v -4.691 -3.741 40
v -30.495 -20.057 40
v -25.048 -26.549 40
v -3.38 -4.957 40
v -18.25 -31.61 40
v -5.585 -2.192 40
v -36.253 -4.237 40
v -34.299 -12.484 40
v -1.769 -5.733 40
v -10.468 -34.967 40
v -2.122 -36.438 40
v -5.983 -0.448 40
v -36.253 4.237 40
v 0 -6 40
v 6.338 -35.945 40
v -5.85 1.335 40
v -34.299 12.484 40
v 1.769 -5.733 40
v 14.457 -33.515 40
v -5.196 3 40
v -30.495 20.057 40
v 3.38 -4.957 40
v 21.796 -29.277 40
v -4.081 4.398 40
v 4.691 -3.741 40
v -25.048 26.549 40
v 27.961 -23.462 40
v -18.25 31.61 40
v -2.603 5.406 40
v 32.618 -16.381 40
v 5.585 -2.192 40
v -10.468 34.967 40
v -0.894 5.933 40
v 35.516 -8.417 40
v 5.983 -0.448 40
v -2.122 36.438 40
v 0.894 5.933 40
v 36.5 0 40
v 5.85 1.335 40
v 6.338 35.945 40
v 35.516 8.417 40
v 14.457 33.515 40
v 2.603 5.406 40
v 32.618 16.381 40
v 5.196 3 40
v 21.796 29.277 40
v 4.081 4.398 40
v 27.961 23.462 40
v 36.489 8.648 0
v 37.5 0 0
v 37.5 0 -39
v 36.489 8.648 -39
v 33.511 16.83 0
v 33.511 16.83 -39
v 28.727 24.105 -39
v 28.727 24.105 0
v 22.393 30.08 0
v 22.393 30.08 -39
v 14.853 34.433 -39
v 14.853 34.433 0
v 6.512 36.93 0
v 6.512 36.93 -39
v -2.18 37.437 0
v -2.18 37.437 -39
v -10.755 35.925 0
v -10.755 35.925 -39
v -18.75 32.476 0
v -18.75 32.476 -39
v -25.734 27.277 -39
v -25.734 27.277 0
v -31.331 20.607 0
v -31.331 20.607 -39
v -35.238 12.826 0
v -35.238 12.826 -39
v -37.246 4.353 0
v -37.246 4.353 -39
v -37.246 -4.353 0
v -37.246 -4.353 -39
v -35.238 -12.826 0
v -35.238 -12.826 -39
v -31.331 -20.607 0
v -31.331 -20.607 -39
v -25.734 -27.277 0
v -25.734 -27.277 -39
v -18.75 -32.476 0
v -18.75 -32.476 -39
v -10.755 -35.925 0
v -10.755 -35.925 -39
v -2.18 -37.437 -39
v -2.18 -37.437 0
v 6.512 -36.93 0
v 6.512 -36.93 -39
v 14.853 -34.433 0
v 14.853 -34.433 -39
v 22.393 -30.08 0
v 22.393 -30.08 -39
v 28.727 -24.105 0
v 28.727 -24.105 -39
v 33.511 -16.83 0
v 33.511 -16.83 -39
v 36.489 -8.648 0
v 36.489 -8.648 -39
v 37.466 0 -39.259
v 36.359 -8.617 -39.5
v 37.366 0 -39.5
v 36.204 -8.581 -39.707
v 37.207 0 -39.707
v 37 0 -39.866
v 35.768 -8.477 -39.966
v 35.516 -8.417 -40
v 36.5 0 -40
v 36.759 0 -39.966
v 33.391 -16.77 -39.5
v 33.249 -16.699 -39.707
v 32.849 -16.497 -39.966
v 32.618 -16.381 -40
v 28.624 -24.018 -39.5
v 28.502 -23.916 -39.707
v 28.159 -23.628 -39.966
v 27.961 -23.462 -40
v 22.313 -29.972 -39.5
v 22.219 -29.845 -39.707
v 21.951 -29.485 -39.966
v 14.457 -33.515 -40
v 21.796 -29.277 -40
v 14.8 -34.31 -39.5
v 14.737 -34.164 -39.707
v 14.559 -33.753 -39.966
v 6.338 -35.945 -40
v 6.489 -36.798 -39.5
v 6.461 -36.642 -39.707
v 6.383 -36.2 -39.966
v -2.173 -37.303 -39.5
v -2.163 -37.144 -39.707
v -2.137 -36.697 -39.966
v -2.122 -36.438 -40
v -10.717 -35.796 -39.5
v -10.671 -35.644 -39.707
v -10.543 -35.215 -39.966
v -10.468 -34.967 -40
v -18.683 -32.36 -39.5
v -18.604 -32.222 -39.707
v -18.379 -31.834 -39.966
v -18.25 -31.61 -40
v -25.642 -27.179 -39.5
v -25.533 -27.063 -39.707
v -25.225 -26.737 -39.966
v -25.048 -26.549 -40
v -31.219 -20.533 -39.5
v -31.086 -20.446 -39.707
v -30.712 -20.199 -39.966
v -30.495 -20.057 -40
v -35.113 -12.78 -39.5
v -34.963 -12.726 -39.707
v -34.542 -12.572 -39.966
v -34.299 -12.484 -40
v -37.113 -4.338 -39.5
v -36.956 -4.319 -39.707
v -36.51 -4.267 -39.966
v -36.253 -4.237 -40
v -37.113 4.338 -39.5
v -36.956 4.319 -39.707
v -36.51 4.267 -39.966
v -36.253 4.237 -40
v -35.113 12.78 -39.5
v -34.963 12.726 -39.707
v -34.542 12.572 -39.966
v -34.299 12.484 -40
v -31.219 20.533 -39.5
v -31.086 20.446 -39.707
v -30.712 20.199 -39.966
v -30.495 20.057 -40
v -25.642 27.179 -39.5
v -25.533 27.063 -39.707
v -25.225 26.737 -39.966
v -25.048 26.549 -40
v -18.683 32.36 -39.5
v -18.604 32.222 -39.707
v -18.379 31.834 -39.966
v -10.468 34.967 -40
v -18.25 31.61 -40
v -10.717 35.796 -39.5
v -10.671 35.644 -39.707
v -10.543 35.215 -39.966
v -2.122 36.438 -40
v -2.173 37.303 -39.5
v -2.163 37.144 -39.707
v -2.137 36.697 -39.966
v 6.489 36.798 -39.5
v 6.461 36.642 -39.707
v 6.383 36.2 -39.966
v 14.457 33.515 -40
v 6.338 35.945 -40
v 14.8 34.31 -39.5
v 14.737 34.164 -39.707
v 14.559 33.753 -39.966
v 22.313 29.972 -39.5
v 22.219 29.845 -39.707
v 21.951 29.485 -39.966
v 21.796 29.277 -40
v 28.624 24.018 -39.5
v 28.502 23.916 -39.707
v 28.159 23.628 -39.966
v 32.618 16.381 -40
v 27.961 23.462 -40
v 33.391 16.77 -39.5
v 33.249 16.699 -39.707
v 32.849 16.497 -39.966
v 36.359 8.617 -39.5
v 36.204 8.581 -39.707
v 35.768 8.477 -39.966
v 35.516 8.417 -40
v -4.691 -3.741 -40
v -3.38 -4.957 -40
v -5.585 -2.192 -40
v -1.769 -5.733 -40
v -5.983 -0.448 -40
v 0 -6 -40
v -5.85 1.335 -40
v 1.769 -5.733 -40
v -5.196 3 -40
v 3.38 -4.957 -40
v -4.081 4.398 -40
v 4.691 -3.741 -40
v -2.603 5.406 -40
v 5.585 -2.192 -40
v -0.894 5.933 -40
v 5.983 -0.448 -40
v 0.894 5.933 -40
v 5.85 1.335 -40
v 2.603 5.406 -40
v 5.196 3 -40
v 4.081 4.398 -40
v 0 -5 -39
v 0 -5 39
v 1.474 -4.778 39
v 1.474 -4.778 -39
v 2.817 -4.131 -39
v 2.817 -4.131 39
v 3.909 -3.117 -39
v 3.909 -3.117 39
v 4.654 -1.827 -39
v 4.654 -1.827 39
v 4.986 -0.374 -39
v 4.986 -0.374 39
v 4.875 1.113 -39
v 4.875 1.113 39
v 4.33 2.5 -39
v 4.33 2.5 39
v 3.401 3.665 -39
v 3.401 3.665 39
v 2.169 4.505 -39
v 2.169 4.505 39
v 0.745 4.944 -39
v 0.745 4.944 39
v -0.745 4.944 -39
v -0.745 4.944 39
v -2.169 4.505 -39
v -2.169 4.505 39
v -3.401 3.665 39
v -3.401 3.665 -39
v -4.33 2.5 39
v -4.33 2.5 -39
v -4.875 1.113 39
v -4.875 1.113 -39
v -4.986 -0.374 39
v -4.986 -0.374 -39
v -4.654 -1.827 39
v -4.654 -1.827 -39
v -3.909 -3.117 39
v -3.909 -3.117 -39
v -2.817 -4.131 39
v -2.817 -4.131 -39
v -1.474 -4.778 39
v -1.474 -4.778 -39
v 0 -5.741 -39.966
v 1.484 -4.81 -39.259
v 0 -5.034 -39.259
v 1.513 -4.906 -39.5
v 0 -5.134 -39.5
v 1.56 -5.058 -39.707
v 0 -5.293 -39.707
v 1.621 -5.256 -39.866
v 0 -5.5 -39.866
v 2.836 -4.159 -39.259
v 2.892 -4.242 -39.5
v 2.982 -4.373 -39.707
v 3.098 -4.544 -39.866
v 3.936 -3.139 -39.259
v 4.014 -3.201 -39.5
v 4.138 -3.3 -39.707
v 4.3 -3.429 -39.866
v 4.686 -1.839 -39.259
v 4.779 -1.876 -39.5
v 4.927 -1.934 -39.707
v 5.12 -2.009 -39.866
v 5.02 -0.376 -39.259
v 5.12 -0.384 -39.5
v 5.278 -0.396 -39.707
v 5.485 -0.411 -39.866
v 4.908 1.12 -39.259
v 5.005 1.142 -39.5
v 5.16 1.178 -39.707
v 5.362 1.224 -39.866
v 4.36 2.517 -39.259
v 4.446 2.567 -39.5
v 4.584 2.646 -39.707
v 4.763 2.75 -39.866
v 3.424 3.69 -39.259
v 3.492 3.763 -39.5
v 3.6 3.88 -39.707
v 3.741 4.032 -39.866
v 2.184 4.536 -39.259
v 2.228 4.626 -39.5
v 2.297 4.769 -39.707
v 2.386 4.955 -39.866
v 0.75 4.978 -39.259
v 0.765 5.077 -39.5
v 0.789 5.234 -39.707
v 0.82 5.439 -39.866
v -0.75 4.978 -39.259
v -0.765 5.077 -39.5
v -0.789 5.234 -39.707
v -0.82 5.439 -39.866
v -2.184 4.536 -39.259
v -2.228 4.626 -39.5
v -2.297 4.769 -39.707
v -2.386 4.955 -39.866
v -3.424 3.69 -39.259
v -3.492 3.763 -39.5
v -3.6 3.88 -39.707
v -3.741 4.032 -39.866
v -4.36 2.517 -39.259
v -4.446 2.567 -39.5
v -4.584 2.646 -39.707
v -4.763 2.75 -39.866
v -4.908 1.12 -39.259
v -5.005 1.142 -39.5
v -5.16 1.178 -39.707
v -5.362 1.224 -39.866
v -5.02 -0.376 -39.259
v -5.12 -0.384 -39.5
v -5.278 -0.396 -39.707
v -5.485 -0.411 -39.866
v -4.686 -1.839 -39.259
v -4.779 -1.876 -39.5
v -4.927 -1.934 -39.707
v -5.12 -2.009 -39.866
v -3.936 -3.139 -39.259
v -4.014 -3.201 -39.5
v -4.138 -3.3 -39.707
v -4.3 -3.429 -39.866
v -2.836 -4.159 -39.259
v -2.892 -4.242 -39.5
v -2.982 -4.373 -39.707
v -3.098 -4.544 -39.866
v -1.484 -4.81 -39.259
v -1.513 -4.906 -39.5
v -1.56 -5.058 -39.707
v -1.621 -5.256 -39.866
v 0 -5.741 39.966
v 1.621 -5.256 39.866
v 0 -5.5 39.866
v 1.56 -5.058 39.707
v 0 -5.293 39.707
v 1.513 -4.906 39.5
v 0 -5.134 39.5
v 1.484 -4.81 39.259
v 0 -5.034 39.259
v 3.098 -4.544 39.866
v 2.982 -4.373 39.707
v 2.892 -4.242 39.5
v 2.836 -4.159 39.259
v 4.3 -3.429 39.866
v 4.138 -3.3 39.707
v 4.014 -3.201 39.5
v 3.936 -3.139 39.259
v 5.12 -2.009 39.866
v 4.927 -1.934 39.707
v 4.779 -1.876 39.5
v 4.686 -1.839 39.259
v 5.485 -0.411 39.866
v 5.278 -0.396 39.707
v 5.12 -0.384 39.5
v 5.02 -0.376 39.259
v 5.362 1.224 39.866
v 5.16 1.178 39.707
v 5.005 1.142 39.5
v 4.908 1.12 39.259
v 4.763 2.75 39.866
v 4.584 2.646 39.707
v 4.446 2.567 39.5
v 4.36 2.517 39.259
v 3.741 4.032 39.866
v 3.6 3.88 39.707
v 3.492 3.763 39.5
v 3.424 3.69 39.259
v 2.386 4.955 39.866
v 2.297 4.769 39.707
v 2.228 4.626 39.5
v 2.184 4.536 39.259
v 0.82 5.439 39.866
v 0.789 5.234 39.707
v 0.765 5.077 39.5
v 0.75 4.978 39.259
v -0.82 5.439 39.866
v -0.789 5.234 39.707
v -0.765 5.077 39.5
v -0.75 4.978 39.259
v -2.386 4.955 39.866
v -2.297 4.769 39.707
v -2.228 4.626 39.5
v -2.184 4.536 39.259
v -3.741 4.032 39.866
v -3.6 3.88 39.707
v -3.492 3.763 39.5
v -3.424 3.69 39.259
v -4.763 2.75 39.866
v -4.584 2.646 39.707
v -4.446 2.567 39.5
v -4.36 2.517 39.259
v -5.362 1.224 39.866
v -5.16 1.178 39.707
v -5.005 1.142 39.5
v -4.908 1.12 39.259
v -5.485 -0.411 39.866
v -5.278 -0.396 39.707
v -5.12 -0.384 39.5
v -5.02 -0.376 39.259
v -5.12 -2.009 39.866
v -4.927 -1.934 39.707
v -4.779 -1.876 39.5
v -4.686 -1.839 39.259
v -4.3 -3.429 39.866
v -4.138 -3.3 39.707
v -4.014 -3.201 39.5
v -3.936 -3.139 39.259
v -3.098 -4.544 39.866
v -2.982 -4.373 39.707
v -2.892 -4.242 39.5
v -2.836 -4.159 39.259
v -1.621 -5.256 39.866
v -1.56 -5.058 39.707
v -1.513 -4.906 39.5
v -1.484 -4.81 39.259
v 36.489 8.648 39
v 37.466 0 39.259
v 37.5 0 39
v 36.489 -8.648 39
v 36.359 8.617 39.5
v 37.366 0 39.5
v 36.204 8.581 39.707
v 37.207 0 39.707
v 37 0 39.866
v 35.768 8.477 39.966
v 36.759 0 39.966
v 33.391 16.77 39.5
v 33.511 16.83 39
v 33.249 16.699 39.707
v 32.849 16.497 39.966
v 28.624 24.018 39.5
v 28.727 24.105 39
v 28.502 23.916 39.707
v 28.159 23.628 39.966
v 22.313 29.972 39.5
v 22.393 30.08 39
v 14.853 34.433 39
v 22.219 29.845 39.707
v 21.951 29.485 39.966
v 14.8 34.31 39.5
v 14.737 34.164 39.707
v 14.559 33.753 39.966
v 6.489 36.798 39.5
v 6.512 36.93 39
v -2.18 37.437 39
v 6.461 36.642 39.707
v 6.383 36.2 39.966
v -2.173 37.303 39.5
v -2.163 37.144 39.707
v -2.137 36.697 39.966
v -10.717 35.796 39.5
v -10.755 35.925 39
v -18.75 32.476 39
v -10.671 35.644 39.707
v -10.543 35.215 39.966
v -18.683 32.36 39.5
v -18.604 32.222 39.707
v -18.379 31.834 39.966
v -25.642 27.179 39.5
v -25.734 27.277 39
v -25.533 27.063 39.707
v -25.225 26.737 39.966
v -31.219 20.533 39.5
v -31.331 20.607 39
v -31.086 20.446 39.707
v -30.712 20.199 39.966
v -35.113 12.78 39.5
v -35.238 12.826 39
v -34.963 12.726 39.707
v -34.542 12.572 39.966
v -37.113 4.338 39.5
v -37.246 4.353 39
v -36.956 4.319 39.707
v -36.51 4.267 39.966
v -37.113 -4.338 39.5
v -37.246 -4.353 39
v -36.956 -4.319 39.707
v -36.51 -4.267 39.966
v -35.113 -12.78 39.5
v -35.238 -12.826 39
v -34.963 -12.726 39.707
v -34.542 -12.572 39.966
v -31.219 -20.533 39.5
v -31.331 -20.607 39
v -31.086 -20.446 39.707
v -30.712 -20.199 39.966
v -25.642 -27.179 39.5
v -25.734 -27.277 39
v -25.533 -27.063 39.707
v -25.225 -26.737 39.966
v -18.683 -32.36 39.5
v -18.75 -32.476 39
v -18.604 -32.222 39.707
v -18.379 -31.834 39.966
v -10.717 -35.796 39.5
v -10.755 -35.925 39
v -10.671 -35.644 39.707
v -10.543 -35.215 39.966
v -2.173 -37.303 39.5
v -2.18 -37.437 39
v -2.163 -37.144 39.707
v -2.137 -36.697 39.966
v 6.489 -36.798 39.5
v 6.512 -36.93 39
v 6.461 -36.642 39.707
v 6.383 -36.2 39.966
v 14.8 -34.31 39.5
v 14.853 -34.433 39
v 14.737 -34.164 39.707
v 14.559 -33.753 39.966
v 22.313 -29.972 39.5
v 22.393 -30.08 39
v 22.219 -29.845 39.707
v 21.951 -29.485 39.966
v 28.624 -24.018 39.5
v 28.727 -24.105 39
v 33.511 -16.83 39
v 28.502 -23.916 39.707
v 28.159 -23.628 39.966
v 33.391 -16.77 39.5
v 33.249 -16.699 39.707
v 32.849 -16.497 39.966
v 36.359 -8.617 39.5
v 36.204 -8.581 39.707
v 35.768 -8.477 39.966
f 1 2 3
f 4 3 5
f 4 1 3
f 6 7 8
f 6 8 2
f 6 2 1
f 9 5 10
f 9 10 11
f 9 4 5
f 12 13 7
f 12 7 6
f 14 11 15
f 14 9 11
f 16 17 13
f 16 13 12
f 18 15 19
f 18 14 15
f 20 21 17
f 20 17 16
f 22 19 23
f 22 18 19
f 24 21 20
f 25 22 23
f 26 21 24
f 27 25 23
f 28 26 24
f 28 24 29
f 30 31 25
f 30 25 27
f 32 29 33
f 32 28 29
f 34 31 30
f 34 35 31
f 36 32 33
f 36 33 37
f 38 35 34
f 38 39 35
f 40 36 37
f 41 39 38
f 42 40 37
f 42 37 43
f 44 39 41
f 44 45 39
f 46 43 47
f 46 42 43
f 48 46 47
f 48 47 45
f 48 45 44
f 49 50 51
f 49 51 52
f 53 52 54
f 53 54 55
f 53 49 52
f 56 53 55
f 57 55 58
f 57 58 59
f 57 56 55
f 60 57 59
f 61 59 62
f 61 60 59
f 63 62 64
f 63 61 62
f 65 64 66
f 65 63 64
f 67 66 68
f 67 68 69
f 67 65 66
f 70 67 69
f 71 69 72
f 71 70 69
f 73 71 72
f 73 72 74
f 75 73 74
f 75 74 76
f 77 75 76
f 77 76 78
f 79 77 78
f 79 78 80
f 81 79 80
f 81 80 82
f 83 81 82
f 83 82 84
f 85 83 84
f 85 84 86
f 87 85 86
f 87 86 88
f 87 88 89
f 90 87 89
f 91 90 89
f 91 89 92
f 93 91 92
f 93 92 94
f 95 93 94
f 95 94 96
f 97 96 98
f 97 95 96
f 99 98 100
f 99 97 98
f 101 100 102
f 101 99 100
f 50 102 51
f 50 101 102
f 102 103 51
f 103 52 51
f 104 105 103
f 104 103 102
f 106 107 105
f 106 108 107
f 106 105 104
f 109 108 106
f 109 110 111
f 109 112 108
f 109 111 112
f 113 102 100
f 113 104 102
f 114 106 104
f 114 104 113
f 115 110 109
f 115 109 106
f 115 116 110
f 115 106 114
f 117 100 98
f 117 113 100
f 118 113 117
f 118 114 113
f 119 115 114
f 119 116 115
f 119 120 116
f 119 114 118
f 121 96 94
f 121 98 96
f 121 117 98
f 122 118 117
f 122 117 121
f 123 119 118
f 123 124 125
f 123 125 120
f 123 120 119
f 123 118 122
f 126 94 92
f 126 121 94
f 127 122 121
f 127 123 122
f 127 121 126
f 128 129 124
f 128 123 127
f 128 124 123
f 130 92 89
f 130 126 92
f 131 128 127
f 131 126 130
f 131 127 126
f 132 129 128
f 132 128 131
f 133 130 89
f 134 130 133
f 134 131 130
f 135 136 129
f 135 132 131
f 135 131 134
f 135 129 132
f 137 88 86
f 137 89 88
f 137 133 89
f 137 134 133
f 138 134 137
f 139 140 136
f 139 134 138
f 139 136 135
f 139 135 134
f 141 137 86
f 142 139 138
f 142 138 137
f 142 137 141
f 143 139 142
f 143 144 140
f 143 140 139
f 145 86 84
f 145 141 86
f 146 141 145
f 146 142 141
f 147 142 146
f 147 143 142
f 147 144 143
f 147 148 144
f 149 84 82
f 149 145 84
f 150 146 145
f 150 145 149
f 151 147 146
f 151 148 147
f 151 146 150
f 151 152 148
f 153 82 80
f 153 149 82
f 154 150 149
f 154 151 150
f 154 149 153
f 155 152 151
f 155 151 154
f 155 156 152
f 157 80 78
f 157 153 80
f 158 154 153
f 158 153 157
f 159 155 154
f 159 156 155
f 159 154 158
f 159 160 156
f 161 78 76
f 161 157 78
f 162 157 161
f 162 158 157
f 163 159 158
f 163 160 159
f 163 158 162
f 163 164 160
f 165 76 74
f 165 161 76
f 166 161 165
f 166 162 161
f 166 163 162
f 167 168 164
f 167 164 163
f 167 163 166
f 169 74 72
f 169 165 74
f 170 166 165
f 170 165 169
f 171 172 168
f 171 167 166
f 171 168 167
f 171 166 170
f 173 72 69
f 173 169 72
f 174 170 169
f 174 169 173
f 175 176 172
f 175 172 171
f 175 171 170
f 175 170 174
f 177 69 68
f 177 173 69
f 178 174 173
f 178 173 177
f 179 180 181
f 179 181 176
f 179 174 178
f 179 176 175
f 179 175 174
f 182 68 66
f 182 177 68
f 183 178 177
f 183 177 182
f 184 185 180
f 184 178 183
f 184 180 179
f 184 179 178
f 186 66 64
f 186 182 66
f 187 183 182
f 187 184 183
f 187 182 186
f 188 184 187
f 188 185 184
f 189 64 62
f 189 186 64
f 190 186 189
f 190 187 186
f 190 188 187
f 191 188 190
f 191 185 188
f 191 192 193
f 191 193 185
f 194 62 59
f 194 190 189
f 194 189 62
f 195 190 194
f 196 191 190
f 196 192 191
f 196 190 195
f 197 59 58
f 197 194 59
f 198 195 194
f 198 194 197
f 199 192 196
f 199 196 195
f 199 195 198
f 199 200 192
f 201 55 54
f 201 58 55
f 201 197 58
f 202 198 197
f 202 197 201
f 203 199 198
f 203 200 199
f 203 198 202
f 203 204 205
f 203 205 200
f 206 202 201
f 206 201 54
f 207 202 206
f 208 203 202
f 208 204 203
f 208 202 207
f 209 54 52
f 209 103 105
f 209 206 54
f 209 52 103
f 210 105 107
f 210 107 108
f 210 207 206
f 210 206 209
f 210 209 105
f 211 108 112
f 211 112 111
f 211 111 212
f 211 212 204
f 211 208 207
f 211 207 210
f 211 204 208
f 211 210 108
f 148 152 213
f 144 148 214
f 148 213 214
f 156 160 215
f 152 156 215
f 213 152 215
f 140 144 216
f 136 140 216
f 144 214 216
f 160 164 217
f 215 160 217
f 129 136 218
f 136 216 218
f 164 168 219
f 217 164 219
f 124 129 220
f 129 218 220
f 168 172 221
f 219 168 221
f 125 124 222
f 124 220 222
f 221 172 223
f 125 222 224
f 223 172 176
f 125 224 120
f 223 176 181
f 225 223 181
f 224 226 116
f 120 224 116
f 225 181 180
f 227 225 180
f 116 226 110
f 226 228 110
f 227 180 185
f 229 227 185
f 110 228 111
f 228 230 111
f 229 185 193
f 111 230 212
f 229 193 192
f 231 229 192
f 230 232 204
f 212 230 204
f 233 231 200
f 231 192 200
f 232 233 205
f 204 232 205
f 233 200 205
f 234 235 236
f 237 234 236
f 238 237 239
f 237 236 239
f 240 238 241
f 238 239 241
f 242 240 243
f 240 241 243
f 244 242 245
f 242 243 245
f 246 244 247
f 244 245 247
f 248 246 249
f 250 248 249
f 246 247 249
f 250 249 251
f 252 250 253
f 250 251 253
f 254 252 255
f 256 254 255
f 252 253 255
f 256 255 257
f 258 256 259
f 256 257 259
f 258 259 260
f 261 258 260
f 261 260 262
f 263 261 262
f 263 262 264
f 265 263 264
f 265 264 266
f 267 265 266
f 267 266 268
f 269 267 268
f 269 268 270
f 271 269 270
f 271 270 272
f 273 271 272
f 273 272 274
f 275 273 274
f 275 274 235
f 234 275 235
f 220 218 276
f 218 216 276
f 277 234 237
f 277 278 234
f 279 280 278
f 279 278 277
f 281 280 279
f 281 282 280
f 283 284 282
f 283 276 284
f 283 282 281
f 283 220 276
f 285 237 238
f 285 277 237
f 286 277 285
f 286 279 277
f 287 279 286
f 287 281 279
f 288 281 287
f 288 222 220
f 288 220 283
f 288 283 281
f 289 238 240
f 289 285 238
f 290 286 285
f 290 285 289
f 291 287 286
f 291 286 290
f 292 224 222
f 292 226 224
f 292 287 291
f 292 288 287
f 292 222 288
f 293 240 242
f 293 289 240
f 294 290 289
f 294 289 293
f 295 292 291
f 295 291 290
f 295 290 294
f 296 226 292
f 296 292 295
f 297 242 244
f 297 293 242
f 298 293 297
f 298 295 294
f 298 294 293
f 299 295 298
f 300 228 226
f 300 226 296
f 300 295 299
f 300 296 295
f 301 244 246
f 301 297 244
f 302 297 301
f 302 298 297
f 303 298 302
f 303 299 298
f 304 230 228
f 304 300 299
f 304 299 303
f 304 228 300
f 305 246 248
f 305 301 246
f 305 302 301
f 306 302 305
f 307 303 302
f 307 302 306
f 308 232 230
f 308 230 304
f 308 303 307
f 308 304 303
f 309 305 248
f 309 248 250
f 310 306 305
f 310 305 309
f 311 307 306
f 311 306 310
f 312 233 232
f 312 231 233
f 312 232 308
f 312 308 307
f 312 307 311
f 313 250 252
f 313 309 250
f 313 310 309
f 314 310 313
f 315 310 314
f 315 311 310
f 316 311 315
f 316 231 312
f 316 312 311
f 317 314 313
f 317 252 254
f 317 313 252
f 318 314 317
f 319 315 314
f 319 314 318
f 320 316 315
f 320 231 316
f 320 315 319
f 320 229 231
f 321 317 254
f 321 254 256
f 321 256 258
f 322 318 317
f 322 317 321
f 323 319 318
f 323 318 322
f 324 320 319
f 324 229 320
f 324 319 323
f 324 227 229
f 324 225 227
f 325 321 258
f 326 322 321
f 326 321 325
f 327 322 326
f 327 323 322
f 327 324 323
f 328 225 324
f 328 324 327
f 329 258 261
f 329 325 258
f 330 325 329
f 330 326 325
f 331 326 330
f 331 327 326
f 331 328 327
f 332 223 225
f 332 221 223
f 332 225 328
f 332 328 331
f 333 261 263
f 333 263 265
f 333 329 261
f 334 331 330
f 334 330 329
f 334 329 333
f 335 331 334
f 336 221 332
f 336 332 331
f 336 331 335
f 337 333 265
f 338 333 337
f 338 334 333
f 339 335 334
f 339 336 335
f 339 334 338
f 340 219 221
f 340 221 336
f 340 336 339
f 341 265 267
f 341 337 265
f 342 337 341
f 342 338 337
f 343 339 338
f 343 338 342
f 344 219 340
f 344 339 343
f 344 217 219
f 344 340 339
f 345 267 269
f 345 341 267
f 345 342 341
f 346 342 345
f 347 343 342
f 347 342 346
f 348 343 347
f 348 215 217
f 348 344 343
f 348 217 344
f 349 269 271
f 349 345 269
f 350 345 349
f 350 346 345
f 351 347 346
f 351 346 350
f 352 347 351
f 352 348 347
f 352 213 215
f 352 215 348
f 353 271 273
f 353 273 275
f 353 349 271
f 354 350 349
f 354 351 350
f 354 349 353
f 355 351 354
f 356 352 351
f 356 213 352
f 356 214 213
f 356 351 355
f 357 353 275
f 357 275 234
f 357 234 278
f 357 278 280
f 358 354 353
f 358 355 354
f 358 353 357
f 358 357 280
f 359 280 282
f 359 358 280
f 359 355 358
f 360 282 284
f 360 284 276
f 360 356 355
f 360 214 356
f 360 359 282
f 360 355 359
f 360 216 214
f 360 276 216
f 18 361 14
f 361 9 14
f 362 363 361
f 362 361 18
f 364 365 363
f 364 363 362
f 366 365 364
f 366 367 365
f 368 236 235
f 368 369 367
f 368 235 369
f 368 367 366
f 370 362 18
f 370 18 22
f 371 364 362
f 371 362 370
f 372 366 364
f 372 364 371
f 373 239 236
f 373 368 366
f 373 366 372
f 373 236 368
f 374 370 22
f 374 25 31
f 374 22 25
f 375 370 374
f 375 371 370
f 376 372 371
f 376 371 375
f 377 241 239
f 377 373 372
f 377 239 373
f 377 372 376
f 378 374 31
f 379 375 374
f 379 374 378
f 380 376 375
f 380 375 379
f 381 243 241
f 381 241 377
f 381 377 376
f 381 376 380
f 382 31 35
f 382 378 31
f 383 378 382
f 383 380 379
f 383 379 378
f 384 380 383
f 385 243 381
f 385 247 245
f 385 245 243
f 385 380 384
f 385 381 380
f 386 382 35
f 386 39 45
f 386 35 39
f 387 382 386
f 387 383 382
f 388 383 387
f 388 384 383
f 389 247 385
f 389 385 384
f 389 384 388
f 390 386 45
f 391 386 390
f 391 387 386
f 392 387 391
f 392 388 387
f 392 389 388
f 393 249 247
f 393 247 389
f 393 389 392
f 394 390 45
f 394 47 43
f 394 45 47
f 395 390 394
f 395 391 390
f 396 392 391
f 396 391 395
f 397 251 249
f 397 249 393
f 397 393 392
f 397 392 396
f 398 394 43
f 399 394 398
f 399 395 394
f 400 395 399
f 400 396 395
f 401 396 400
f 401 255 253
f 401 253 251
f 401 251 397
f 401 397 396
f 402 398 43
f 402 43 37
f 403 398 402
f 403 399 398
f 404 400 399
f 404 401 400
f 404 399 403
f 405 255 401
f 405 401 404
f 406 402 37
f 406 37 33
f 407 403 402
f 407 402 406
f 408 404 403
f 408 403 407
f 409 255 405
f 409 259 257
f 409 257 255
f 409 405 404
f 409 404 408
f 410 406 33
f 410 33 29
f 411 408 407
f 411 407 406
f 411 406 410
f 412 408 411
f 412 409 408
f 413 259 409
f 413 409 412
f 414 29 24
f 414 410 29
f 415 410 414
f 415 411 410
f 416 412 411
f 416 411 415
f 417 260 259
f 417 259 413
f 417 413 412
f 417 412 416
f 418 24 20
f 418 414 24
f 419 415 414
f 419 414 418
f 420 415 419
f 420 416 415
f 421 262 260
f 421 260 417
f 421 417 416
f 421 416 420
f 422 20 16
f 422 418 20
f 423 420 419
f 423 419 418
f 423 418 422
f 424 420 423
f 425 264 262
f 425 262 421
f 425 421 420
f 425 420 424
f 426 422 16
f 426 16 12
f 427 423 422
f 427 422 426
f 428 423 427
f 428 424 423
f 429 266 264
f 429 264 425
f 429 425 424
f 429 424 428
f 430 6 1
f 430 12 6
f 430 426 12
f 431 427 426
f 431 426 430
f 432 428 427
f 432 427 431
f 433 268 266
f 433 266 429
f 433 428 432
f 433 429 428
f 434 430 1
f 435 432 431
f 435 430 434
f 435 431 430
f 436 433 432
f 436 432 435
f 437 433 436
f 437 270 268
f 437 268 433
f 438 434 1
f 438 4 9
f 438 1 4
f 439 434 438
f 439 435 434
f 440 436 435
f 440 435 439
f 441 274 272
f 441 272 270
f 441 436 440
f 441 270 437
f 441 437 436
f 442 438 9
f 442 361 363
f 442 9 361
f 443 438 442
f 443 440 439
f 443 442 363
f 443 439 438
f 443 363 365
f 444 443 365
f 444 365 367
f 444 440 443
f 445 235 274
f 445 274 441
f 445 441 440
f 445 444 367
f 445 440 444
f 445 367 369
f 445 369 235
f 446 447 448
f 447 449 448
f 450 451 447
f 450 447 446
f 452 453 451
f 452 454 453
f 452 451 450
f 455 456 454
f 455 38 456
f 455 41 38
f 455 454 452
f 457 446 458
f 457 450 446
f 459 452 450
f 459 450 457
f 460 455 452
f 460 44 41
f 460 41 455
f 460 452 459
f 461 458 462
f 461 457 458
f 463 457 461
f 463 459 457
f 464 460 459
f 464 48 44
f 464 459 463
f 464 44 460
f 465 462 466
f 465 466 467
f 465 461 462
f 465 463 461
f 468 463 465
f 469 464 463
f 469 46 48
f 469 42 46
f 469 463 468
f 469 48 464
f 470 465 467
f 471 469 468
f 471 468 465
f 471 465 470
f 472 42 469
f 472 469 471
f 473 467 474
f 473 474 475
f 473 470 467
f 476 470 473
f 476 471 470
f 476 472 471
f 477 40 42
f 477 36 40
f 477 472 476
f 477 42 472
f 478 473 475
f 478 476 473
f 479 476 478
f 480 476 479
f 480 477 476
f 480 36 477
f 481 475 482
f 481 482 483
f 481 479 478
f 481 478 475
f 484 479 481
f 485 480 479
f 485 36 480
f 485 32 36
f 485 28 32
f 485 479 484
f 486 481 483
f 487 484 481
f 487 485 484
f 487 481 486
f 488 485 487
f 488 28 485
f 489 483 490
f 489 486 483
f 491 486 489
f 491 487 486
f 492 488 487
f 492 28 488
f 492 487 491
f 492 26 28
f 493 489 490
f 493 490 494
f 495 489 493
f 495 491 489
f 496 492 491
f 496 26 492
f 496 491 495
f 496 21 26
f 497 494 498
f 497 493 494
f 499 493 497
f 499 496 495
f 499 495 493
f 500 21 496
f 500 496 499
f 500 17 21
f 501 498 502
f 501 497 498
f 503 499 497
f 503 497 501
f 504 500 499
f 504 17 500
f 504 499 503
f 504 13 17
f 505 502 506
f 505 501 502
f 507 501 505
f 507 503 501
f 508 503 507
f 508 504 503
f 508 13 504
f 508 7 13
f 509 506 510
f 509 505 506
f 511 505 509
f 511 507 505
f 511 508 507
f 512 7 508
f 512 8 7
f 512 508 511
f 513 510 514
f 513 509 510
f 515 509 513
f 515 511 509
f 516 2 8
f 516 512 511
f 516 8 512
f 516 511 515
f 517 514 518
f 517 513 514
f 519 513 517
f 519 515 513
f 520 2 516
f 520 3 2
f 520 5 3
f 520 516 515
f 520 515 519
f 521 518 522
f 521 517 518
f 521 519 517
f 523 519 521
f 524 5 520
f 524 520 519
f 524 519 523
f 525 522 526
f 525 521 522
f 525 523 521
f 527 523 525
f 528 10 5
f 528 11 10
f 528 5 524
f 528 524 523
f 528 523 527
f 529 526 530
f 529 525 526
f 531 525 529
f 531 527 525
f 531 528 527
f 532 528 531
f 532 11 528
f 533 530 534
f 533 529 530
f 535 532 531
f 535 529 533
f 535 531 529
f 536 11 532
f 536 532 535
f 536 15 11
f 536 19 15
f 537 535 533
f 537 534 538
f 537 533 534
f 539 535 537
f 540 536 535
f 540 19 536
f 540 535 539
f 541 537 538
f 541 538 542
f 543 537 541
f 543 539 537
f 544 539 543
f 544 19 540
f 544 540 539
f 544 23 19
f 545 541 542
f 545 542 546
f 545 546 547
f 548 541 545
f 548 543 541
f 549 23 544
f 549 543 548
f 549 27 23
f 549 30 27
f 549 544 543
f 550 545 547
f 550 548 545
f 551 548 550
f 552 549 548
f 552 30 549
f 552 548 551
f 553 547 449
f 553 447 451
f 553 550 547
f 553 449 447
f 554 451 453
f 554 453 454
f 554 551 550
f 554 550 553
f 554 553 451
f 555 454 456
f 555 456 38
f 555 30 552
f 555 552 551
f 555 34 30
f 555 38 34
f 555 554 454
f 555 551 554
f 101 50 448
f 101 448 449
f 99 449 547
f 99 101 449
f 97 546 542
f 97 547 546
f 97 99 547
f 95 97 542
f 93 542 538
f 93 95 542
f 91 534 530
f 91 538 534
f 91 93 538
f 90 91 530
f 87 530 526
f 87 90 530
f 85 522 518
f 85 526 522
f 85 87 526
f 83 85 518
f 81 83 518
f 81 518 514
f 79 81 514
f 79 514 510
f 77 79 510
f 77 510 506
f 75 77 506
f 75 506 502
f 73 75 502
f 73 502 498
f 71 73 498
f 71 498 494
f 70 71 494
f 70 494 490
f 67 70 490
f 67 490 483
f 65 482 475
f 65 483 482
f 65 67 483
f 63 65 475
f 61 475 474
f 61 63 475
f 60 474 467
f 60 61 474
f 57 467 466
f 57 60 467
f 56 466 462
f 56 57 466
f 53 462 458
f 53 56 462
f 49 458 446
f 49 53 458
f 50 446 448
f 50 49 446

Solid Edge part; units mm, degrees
sketch "Sketch1" plane through (0, 0, 0) normal (0, 0, 1) x (1, 0, 0)
  circle A0 centre (0, 0) radius 37.5
  dimension "D1" = 75
extrude "ExtrudedProtrusion_1" add sketch "Sketch1" along normal mid plane 80
fillet "Round_1" radius 1 2 edges at (-37.5, 0, 40) (-37.5, 0, -40)
hole "Hole_1" at (0, 0, 40) direction (0, 0, -1) diameter 10 end up to next
fillet "Round_2" radius 1 2 edges at (-5, 0, 40) (5, 0, -40)
properties material "Acrylic, high impact grade"
